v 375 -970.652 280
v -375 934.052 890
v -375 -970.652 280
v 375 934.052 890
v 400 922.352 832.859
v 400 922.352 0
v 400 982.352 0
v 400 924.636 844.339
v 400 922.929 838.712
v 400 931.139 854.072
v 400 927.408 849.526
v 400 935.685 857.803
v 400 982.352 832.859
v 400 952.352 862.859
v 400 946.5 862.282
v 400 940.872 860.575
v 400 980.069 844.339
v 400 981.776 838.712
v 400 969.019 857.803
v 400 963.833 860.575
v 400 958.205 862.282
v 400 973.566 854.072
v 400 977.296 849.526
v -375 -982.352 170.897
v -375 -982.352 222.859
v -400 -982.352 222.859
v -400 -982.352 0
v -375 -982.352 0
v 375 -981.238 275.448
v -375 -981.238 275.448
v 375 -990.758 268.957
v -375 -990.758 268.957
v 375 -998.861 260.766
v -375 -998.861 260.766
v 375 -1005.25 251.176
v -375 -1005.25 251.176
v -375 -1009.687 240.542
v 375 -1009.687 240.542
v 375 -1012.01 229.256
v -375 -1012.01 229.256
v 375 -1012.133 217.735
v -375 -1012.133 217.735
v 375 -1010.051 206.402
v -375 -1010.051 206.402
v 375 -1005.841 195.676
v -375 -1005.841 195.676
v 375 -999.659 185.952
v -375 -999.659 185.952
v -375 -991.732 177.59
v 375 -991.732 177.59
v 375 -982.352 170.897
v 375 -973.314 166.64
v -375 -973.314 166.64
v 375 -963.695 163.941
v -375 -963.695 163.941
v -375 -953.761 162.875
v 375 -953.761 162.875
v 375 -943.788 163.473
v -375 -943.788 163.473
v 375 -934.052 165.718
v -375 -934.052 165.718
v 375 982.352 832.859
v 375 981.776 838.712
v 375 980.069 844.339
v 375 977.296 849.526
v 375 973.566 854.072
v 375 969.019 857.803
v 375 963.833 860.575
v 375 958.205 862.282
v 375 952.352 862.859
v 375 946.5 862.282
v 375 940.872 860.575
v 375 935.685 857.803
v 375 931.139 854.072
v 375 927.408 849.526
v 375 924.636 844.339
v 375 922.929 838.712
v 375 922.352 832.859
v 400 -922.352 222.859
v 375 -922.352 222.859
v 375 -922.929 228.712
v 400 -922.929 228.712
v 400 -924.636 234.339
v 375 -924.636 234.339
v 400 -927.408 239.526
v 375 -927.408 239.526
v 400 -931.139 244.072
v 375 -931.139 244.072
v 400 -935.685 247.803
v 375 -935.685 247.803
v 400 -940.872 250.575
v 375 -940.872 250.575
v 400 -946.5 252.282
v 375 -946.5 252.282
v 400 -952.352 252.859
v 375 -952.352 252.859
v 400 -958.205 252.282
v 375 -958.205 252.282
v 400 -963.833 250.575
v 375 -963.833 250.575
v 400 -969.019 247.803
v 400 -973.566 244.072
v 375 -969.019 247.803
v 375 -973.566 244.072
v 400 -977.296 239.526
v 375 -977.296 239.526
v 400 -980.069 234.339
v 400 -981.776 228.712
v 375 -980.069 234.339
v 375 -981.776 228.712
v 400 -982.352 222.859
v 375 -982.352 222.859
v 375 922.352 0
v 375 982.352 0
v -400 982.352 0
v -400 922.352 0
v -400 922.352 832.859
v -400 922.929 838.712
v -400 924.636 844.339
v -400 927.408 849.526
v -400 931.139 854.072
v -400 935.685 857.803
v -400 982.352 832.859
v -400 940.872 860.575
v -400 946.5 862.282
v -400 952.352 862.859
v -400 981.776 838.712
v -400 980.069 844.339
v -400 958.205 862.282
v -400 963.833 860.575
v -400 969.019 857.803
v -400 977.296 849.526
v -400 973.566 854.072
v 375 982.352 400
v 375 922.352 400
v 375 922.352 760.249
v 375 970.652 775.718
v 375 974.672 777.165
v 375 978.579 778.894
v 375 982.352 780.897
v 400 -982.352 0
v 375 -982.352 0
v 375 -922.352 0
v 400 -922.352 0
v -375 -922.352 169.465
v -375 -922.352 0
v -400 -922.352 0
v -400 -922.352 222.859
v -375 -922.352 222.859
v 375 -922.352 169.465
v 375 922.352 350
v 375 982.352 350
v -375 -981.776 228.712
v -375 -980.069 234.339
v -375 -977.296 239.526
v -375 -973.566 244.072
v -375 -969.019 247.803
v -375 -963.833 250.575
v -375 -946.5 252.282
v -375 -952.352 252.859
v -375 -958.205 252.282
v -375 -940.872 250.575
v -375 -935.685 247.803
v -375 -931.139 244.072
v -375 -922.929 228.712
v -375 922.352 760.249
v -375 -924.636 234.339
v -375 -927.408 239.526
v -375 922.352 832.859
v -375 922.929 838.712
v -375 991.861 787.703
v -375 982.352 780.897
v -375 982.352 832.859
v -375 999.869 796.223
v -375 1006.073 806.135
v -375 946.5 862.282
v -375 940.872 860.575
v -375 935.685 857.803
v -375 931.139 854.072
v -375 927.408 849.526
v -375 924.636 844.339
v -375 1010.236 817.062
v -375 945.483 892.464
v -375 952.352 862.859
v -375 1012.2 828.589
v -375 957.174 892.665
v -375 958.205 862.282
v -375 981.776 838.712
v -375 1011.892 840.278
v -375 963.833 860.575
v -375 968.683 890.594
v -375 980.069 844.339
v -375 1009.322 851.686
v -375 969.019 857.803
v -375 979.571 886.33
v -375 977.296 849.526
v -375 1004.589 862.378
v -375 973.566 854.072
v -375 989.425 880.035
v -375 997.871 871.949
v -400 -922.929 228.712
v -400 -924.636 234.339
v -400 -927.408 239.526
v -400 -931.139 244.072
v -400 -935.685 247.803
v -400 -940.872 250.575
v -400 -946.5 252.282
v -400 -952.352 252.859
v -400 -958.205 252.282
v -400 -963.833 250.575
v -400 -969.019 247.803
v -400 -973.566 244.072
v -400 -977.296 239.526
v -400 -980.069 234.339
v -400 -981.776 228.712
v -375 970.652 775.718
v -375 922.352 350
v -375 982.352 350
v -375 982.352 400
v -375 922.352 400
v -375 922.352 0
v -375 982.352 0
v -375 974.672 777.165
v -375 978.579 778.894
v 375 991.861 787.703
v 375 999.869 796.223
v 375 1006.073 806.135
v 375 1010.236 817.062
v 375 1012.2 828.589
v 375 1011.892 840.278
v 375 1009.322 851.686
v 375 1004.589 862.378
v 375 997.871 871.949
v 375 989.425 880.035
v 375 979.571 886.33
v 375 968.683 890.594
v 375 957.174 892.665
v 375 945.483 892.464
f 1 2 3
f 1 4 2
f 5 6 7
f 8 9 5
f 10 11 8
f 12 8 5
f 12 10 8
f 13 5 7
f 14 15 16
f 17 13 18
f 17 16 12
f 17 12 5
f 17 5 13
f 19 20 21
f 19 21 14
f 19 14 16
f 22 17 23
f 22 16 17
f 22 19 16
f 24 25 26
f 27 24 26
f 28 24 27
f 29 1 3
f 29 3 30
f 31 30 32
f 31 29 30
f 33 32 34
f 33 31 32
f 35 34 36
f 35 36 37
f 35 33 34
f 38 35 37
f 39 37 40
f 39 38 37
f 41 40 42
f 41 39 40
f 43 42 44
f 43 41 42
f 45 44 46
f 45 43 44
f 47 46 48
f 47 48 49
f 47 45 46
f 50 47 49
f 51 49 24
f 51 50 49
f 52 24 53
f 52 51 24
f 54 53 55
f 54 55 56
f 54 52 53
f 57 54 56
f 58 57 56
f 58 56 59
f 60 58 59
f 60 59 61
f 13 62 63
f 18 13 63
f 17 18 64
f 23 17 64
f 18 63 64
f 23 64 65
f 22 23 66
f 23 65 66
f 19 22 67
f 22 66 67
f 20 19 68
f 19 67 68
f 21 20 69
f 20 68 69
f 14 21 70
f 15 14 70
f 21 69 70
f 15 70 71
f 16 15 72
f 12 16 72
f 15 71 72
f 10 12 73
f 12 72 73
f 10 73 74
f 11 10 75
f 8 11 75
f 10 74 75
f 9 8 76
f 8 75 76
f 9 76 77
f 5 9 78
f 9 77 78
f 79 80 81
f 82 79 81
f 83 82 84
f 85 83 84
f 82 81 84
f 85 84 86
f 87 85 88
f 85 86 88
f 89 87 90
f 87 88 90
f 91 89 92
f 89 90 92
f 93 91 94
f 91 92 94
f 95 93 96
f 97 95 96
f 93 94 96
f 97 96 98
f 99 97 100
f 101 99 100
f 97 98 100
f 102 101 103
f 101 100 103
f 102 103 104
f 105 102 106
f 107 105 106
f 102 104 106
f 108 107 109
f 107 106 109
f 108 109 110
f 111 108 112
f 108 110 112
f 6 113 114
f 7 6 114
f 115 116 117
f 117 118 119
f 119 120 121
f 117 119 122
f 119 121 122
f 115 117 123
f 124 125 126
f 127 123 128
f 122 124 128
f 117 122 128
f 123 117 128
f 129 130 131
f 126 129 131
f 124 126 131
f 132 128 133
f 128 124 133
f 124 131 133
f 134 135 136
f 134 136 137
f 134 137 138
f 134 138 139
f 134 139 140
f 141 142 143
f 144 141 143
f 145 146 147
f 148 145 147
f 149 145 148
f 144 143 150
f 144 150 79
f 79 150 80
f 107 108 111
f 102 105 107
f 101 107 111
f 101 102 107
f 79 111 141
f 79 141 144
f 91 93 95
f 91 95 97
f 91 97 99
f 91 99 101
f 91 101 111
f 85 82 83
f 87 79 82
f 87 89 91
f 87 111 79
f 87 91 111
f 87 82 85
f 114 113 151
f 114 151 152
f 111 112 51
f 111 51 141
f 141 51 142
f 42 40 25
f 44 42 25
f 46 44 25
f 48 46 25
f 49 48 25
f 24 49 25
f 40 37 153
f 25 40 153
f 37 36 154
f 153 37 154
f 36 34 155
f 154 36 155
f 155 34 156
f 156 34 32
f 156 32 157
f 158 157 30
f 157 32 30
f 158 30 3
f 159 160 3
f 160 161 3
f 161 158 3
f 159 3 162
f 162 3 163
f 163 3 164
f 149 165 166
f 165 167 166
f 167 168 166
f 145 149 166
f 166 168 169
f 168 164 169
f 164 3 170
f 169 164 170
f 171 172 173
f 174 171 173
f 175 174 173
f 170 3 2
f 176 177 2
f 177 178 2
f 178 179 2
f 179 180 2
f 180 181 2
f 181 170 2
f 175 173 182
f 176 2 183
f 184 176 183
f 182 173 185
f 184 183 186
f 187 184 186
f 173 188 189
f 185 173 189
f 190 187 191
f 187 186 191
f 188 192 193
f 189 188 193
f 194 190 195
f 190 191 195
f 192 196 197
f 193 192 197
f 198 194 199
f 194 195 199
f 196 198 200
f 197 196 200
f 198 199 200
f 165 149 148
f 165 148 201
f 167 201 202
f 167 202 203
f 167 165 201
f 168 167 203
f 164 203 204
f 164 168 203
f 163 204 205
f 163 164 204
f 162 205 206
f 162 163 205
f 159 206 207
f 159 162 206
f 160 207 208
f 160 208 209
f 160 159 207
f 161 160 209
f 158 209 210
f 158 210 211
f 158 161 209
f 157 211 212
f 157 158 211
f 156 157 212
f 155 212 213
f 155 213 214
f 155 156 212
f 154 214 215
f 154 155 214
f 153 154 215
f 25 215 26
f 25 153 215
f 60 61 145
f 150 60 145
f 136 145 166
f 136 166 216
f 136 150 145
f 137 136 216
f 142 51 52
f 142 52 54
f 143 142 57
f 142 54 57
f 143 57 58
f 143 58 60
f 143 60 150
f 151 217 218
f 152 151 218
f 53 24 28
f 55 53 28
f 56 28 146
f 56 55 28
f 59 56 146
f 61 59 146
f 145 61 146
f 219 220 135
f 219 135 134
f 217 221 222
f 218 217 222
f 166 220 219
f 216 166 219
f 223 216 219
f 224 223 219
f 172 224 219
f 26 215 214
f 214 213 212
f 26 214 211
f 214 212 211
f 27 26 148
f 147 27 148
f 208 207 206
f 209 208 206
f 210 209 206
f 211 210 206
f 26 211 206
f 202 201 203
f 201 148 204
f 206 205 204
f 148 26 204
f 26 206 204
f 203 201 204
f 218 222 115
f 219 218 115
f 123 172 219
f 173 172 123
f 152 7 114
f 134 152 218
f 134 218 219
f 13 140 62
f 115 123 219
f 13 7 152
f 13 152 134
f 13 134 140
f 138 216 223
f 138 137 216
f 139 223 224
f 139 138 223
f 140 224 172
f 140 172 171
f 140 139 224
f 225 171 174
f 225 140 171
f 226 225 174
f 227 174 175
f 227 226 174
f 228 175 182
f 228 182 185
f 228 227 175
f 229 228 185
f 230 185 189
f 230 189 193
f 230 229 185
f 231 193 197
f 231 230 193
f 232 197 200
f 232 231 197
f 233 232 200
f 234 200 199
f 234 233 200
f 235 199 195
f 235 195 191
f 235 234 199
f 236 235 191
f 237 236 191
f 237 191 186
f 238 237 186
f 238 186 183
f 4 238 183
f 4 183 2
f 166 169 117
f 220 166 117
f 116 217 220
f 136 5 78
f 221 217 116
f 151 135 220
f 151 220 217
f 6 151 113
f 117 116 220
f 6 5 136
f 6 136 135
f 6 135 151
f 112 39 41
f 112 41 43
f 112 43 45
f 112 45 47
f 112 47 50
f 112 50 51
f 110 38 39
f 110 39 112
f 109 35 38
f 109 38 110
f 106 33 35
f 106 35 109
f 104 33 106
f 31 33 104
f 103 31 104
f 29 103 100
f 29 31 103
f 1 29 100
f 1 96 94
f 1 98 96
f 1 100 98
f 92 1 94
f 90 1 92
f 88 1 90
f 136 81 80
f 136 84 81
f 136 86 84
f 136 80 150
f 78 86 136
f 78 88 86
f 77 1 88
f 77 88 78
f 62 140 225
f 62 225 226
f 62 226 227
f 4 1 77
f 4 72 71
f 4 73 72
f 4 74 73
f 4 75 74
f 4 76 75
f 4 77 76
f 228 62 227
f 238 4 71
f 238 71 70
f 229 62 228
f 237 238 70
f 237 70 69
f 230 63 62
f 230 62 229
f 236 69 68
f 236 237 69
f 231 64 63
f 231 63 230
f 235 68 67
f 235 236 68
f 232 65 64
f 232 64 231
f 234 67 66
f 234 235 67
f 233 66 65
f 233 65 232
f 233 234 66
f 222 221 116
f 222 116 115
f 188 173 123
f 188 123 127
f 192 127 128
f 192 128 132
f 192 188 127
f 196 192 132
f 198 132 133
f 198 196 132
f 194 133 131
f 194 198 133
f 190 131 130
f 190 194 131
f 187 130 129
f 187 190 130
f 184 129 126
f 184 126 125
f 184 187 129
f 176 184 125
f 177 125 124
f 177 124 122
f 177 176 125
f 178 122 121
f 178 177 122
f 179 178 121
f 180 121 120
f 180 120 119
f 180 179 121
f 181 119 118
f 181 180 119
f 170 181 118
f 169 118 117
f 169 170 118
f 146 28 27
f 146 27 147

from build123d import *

# Parameters (mm, degrees)
F1_DEPTH = 375
F3_DEPTH = 25
F5_W     = 60
F5_H     = 50
F6_DEPTH = 750


with BuildPart() as f1:
    # F0 (on Right) → F1 (new body, symmetric)
    with BuildSketch(Plane.YZ):
        with BuildLine():
            Line((934.052350761, 890), (-970.652350761, 280))
            ThreePointArc((-970.652350761, 280), (-1009.4934918067, 204.5588589543), (-934.052350761, 165.7177179087))
            Line((-934.052350761, 165.7177179087), (970.652350761, 775.7177179087))
            ThreePointArc((970.652350761, 775.7177179087), (1009.4934918067, 851.1588589543), (934.052350761, 890))
        make_face()
    extrude(amount=F1_DEPTH, both=True)

    # F2 (on face) → F3 (join)
    with BuildSketch(Plane.YZ.offset(375)):
        with BuildLine():
            Line((-982.352350761, 222.8588589543), (-982.352350761, 0))
            Line((-982.352350761, 0), (-922.352350761, 0))
            Line((-922.352350761, 0), (-922.352350761, 222.8588589543))
            ThreePointArc((-922.352350761, 222.8588589543), (-952.352350761, 252.8588589543), (-982.352350761, 222.8588589543))
        make_face()
        with BuildLine():
            Line((922.352350761, 832.8588589543), (922.352350761, 0))
            Line((922.352350761, 0), (982.352350761, 0))
            Line((982.352350761, 0), (982.352350761, 832.8588589543))
            ThreePointArc((982.352350761, 832.8588589543), (952.352350761, 862.8588589543), (922.352350761, 832.8588589543))
        make_face()
    extrude(amount=F3_DEPTH)

    # F4: F1 across plane


with BuildPart() as f1_1:
    add(f1.part)
    add(f1.part.mirror(Plane.YZ))

    # F5 (on face) → F6 (join, through all)
    with BuildSketch(Plane.YZ.offset(-375)):
        with Locations((952.352350761, 375)):
            Rectangle(F5_W, F5_H)
    extrude(amount=F6_DEPTH)


solid = f1_1.part
